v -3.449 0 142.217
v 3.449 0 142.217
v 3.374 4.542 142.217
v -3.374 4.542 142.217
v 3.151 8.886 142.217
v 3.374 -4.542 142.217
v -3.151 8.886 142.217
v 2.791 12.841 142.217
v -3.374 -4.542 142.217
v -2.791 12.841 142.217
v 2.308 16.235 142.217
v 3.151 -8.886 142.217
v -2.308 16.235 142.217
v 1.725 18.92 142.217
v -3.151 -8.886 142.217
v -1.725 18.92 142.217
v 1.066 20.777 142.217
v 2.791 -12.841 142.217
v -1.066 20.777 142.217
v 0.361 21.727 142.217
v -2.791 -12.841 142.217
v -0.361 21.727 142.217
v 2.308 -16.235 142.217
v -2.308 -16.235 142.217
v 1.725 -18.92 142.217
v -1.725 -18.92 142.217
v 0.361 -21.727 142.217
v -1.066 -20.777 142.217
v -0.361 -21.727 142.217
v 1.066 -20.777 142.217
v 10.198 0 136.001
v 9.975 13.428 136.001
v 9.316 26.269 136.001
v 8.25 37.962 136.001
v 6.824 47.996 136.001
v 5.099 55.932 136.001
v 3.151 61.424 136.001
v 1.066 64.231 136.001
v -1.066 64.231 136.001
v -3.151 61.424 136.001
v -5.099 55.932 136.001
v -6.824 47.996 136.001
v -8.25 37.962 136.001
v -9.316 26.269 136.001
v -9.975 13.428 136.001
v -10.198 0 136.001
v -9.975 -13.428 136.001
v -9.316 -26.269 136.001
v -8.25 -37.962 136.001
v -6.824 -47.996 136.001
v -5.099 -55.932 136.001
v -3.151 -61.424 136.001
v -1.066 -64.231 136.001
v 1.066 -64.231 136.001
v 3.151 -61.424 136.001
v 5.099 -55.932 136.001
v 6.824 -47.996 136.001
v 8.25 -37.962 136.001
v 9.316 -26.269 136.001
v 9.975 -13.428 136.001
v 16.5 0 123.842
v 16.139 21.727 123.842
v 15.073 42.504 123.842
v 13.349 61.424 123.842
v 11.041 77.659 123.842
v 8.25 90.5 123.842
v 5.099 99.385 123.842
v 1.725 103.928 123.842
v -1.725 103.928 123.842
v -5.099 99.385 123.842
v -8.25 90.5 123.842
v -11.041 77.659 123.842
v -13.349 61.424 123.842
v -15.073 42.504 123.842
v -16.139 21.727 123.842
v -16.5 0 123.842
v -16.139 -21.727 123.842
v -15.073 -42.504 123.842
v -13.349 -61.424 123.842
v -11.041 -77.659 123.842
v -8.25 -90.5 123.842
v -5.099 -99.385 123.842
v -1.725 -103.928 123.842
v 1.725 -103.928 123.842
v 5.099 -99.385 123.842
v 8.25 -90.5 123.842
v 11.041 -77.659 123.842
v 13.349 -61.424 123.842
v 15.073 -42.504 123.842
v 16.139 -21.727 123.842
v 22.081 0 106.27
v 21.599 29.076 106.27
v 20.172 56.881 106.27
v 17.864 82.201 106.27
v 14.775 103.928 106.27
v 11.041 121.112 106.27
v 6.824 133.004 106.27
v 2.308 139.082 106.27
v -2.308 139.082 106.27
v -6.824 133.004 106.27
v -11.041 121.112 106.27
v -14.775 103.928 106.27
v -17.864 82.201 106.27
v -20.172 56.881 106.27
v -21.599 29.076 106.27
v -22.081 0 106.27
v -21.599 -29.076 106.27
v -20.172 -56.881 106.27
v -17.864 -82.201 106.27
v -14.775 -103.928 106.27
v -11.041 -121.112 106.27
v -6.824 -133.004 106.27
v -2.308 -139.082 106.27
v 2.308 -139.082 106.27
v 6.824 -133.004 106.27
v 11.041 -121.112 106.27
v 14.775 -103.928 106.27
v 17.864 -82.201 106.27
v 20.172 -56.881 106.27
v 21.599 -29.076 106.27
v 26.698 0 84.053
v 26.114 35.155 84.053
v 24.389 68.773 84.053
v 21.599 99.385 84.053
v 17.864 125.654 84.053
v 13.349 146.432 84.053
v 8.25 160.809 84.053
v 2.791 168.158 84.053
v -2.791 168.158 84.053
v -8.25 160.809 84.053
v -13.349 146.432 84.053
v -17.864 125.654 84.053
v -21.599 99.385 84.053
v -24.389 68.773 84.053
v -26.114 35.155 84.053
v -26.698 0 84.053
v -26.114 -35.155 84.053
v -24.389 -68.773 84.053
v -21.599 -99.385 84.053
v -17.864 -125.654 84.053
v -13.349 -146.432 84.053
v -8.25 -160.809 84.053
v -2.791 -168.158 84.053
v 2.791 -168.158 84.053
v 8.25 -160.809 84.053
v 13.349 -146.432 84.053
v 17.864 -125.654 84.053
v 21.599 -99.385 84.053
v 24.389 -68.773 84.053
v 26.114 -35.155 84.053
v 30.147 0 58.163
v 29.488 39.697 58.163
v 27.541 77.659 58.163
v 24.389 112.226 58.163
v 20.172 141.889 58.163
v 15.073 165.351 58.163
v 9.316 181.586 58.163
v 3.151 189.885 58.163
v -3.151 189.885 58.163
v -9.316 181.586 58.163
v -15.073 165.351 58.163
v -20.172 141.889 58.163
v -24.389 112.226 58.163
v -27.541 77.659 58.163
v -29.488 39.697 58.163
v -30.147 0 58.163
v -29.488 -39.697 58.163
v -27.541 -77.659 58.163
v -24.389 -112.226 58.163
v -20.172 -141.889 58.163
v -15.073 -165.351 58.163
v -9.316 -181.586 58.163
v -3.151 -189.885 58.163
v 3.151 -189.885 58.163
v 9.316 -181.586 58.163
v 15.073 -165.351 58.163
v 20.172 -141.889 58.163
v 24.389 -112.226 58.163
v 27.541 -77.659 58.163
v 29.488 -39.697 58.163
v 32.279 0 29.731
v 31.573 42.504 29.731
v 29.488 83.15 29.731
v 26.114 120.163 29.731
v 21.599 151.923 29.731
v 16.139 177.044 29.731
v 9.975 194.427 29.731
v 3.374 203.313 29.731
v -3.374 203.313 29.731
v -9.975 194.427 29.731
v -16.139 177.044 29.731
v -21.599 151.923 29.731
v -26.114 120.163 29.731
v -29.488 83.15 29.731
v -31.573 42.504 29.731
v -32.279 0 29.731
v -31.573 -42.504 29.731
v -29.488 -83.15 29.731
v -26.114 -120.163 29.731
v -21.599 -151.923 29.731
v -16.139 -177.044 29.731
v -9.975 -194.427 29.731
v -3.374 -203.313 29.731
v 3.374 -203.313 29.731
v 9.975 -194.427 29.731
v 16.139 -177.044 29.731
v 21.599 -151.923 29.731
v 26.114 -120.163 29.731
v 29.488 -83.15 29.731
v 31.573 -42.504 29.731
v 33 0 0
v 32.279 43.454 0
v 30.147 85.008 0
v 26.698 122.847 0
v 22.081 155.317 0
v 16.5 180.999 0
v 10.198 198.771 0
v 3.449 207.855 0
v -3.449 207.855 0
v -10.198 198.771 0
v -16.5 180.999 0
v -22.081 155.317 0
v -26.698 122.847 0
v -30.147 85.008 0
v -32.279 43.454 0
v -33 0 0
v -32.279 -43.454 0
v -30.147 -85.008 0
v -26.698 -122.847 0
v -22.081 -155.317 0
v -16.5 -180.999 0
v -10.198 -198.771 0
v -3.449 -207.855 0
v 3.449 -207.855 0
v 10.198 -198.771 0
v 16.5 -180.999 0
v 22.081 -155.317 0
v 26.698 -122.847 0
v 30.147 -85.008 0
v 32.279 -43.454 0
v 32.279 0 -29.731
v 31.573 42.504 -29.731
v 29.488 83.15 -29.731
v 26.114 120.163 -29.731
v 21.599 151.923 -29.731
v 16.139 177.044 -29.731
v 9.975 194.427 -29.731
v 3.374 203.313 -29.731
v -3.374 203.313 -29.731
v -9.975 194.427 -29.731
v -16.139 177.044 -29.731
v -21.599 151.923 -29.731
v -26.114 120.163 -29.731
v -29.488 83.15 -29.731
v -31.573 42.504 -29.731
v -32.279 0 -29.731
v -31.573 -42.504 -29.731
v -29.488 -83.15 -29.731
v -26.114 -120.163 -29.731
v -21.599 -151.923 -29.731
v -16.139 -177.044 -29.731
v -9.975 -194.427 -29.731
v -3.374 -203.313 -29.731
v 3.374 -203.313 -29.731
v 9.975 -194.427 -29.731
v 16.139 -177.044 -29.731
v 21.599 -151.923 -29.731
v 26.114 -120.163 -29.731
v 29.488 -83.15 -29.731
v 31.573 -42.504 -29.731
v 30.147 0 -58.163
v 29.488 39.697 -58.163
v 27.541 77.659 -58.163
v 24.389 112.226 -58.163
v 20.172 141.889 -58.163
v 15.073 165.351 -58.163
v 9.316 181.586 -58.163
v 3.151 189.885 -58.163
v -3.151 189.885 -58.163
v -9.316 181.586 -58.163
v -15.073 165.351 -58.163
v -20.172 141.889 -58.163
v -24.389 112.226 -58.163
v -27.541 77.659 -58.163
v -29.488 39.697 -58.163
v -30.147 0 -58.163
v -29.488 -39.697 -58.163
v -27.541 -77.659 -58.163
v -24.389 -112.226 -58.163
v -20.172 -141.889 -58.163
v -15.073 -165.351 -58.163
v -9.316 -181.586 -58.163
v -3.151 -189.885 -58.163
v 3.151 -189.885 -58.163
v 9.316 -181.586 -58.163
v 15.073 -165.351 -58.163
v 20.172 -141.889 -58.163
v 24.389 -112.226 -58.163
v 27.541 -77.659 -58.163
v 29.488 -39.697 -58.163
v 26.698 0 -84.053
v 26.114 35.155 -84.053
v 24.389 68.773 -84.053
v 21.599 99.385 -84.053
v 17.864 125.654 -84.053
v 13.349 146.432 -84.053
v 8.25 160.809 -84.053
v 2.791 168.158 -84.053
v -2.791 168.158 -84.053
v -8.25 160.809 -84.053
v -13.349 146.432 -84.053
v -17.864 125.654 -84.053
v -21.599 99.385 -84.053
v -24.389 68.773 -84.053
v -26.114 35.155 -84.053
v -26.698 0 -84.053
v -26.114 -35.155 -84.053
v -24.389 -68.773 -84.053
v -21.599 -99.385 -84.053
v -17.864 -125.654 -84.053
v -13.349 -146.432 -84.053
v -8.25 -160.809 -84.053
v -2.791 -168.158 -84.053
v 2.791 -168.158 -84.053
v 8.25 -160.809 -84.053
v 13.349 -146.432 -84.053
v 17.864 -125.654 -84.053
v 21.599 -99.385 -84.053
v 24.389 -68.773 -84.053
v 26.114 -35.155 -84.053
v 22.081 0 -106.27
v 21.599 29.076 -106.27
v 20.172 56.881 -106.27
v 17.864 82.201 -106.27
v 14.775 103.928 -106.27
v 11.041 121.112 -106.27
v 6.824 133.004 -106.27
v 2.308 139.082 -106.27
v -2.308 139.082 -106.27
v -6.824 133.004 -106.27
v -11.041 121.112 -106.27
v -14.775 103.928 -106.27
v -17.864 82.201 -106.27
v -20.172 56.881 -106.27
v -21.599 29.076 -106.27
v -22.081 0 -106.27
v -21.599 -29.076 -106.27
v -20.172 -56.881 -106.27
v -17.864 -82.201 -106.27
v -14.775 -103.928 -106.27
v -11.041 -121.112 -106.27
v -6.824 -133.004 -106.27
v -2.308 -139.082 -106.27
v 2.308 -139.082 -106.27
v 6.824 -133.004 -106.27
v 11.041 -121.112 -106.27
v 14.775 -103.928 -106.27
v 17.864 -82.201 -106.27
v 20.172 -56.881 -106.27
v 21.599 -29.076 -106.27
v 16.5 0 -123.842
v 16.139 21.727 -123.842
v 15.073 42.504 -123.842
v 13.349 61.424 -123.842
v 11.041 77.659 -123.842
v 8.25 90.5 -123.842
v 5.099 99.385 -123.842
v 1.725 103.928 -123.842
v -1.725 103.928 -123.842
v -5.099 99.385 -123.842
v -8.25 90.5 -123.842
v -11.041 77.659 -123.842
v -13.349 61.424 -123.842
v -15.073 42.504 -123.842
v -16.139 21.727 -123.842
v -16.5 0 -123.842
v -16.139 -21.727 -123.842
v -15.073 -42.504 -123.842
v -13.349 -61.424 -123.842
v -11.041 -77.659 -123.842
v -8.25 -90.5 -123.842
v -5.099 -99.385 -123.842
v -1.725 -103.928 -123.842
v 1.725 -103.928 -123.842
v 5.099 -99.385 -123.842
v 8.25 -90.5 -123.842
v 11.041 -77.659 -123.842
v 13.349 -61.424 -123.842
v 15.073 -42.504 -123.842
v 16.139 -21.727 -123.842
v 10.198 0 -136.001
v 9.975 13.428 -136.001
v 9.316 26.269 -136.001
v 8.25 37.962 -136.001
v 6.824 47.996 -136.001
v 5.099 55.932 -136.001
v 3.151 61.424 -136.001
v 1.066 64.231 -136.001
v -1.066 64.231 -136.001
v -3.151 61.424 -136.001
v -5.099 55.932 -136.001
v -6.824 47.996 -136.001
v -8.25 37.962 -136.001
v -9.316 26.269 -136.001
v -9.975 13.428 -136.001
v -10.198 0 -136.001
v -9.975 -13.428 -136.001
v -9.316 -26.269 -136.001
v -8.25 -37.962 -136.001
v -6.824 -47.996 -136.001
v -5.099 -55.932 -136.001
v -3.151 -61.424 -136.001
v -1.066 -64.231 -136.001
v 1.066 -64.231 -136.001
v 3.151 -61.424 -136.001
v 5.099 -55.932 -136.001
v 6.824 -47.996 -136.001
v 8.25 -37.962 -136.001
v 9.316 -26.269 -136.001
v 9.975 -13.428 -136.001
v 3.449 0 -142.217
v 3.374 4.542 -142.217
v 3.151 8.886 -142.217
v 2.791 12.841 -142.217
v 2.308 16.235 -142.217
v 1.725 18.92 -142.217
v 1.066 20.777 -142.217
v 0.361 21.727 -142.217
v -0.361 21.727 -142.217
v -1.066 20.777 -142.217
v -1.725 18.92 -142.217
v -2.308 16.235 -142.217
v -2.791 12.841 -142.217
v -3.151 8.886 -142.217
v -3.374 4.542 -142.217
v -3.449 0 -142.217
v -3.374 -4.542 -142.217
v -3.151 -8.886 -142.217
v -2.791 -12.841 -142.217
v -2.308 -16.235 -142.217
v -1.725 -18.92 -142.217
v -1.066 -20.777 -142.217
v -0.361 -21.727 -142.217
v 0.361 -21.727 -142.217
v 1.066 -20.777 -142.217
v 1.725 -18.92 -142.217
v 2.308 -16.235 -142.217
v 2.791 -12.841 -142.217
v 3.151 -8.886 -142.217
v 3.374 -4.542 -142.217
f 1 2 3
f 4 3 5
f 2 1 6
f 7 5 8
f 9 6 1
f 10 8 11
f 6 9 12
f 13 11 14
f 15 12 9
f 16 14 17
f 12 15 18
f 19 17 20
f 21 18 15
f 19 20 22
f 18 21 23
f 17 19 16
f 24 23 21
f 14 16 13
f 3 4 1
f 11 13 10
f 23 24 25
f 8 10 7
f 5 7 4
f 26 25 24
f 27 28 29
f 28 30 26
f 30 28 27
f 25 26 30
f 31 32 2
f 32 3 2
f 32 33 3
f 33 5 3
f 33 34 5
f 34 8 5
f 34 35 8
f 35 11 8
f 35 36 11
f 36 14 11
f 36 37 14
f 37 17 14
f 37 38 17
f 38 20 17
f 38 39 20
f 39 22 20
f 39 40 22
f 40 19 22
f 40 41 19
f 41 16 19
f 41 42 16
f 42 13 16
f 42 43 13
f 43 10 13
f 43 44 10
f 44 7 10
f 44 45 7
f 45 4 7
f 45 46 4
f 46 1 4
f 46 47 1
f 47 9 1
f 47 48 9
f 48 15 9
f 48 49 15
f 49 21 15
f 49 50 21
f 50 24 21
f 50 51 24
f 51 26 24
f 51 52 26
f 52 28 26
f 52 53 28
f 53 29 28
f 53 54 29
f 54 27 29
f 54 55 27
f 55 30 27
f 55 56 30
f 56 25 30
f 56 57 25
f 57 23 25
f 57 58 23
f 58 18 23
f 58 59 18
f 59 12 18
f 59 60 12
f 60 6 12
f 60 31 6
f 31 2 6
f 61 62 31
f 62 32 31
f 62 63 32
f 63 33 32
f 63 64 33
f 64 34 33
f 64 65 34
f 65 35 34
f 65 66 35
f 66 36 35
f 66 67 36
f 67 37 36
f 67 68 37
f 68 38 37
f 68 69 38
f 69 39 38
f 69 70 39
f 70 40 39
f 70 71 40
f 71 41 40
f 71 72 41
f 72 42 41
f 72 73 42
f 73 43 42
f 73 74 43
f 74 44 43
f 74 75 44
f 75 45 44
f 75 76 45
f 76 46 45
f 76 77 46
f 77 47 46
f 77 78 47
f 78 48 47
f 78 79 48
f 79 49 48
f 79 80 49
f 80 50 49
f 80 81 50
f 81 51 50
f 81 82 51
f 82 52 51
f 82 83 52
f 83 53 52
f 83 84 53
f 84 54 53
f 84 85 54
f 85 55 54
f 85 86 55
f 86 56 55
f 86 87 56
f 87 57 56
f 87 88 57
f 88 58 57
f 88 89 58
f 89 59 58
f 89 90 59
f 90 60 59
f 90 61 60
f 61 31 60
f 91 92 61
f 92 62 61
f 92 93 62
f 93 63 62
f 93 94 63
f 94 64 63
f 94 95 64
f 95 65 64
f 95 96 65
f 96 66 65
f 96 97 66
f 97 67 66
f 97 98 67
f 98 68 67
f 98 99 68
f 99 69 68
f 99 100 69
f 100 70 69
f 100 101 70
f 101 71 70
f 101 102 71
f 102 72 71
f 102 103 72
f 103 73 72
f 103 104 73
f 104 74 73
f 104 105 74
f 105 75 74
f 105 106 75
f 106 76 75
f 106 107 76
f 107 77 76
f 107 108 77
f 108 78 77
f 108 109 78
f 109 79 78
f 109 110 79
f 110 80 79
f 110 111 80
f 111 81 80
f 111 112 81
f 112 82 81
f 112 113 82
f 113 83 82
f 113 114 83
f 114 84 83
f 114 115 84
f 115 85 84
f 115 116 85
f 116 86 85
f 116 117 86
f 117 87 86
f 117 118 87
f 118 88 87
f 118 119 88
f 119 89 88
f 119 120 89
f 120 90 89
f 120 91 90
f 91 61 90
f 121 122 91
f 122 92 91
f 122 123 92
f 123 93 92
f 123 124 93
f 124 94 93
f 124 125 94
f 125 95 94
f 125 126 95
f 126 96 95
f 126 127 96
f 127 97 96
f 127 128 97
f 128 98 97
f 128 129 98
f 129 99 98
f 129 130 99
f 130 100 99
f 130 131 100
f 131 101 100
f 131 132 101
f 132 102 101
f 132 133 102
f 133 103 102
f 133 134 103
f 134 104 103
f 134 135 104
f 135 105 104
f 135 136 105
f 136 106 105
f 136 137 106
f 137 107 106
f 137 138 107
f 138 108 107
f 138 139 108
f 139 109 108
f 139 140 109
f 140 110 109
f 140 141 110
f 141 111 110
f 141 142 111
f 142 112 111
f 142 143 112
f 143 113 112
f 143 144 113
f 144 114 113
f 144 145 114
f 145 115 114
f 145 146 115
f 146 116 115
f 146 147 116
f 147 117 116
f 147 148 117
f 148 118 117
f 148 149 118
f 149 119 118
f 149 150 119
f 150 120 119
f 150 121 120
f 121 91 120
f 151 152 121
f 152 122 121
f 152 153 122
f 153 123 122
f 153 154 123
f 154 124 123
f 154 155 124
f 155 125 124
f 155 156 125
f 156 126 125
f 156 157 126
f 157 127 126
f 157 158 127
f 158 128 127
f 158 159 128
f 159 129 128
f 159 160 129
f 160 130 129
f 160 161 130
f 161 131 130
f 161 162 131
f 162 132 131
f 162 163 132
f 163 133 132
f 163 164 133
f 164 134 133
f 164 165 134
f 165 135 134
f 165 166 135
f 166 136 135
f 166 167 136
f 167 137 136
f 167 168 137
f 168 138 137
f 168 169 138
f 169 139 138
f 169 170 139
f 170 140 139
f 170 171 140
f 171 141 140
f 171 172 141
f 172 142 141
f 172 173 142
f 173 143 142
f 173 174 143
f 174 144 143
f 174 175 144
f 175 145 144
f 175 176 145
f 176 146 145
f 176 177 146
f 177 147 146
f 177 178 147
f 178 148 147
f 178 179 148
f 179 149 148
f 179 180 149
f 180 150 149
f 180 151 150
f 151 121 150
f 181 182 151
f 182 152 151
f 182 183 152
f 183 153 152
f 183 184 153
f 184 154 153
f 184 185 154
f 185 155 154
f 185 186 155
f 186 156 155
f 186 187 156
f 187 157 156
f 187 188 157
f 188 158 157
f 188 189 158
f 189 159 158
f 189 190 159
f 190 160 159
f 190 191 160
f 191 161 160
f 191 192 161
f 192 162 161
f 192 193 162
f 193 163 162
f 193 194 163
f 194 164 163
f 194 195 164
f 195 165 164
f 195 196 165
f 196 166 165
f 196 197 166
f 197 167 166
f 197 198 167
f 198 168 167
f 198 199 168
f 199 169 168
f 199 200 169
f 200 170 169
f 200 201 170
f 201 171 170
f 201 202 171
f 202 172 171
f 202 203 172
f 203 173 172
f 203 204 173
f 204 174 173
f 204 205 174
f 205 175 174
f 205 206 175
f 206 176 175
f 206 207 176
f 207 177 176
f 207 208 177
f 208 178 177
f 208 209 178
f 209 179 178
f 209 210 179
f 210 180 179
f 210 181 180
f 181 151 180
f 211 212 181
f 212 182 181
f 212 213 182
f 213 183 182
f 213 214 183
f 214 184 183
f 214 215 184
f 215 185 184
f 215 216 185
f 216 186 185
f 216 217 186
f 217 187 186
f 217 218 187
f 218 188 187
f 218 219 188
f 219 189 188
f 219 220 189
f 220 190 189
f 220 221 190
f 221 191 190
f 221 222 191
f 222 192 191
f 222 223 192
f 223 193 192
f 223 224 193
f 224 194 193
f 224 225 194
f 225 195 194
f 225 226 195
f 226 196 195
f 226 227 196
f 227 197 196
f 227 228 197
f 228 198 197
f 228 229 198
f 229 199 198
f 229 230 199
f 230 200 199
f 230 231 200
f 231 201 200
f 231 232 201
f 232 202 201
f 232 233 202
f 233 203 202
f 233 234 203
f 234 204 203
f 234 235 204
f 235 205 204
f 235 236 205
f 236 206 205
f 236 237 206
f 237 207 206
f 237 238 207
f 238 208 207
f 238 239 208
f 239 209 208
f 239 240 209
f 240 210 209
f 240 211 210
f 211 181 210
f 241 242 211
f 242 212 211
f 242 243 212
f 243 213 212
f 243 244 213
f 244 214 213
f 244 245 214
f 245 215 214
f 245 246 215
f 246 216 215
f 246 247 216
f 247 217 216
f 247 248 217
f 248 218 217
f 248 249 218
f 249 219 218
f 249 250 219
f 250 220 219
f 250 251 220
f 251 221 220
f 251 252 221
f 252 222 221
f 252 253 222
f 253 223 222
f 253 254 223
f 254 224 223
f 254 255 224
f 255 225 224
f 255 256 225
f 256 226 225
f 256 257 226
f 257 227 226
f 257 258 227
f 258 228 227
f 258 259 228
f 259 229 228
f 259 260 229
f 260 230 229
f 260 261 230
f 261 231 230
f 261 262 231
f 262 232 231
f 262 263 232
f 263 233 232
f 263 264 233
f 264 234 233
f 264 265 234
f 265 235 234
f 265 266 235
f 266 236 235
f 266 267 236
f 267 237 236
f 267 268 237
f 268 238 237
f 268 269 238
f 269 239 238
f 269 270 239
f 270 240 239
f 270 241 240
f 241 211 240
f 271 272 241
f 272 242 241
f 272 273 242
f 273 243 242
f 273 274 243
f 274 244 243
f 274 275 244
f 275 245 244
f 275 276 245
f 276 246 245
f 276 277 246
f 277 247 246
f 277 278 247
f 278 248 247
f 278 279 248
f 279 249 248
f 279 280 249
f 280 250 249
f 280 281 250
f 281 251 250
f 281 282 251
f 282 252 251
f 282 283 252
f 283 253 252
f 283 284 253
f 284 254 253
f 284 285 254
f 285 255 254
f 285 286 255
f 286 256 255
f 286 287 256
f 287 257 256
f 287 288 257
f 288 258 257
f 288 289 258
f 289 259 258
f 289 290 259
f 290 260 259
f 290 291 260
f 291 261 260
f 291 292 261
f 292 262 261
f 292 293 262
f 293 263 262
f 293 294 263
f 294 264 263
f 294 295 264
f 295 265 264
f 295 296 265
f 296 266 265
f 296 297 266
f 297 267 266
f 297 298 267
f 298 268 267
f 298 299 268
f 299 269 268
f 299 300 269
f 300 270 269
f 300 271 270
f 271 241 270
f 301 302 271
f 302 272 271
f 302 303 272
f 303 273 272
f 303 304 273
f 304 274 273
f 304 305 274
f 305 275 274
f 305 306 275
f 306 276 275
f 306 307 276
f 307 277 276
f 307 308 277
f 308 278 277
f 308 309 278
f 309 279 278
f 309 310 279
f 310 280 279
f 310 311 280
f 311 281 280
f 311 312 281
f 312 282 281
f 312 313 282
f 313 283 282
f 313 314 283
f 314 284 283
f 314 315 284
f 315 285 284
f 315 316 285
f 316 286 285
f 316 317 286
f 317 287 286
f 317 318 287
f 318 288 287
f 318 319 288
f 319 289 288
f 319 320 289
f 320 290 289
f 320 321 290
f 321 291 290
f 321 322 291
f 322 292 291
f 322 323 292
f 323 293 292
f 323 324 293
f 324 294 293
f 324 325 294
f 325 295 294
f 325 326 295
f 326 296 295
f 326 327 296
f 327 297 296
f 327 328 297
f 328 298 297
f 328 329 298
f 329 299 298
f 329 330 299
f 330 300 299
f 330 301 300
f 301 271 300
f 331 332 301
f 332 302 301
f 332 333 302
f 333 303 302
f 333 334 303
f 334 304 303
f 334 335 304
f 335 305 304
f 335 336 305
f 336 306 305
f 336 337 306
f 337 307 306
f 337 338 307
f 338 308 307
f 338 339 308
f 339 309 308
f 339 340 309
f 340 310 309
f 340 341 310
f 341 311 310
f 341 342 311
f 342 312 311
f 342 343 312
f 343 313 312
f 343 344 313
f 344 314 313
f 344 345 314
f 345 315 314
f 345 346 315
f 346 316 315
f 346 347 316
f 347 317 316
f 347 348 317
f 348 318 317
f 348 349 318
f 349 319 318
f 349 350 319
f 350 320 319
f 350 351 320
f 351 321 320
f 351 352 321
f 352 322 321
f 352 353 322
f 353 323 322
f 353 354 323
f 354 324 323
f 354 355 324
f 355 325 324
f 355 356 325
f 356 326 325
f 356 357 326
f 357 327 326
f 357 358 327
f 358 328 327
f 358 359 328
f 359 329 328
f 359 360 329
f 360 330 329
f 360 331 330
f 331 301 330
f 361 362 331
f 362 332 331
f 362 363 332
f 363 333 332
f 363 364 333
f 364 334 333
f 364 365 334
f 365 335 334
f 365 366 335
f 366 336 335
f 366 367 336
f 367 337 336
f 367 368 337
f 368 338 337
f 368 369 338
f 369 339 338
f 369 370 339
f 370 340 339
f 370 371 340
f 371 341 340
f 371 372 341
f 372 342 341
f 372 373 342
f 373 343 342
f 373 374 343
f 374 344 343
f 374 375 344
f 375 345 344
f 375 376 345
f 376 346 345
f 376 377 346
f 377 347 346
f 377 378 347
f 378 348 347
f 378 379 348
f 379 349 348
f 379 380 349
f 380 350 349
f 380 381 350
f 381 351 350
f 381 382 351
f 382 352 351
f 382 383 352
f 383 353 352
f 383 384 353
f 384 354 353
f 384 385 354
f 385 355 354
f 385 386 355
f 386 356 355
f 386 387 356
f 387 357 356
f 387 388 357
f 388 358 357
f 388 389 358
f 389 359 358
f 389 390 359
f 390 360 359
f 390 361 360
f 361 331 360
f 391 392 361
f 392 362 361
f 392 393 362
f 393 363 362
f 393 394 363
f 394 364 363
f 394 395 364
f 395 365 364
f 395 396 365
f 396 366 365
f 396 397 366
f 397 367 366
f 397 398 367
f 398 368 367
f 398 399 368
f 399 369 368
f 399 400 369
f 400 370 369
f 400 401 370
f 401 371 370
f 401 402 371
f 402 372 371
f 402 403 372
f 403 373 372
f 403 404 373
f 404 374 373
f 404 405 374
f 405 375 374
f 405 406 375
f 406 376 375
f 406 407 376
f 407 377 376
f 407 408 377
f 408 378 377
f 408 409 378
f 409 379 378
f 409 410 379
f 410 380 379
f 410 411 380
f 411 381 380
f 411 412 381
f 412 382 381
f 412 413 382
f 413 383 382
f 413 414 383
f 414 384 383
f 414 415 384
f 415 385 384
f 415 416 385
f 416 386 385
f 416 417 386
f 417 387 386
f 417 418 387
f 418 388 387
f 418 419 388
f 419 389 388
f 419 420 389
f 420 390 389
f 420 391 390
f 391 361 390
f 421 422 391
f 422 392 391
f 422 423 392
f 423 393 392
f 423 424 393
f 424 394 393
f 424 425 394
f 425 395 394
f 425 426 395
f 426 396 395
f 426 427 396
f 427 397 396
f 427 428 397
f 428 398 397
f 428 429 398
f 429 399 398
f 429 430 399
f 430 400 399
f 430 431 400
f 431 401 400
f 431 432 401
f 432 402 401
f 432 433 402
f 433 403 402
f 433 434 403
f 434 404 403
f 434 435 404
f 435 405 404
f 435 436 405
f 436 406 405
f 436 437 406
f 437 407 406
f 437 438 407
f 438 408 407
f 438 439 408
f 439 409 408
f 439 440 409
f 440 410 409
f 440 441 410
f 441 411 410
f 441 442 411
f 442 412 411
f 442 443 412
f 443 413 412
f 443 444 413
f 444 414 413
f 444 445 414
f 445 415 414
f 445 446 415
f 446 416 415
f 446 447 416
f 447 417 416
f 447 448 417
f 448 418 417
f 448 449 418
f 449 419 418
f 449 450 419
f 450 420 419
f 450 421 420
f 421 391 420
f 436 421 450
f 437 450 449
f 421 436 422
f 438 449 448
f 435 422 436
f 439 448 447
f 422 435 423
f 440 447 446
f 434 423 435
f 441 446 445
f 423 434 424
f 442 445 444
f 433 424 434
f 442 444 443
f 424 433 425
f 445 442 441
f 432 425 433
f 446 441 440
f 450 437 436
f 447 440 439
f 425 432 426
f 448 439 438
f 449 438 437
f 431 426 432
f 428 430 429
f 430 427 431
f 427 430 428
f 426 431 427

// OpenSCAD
// Generated by SolidPython 1.0.1 on 2020-07-29 00:46:46


scale(v = [3, 19, 13]) {
	sphere(r = 11);
}
/***********************************************
*********      SolidPython code:      **********
************************************************
 
# import packages: SolidPython
from solid import *
from solid.utils import *
from itertools import chain, combinations, permutations


class Resize:

    def __init__(self, scad_file):
        self.scad_file = scad_file
        #self.scad_file = import_scad(scad_file)
        # cone/cylinder param:
        self.r1 = 0
        self.r2 = 0
        self.h = 0
        # rectangular prism param:
        self.w = 0
        self.l = 0
        # ellipse param:
        self.r = 0

    # import OpenScad code (file name corresponds to shape)


    # classify shape + parameters
    def assign(self, param1, param2, param3):
        if self.scad_file == 'cone.scad':
            self.r1 = param1
            self.r2 = param2
            self.h = param3
        elif self.scad_file == 'cylinder.scad':
            self.r1 = param1
            self.r2 = param2
            self.h = param3
        elif self.scad_file == 'rectangularPrism.scad':
            self.h = param1
            self.l = param2
            self.w = param3
        else:
            self.r = param1
            self.h = param2

    # resize parameters
    def iterate(self):
        x = range(3, 20, 2)
        i = 1
        if self.scad_file == 'cone.scad':
            tempList = list(permutations(x, 2))
            for temp in tempList:
                param1 = temp[0]
                param2 = temp[1]
                filepath = 'produced_scad_files/' + 'cone' + str(param1) + '_' + str(param2) + '_' + '.scad'
                scad_render_to_file(cylinder(h=param1, r1=param2, r2=0), filepath)

        elif self.scad_file == 'cylinder.scad':
            tempList = list(permutations(x, 3))
            for temp in tempList:
                param1 = temp[0]
                param2 = temp[1]
                filepath = 'produced_scad_files/' + 'cylinder' + str(param1) + '_' + str(param2) + '_' + '.scad'
                scad_render_to_file(cylinder(h=param1, r1=param2, r2=param2), filepath)

        elif self.scad_file == 'rectangularPrism.scad':
            tempList = list(permutations(x, 3))
            for temp in tempList:
                param1 = temp[0]
                param2 = temp[1]
                param3 = temp[2]
                filepath = 'produced_scad_files/' + 'rectangularPrism' + str(param1) + '_' + str(param2) + '_' + str(
                    param3) + '.scad'
                scad_render_to_file(cube(size=(param1, param2, param3)), filepath)

        elif self.scad_file == 'ellipse.scad':
            tempList = list(permutations(x, 4))
            for temp in tempList:
                param1 = temp[0]
                param2 = temp[1]
                param3 = temp[2]
                param4 = temp[3]
                filepath = 'produced_scad_files/' + 'ellipse' + str(param1) + '_' + str(param2) + '_' + str(param3) + '_' + str(param4) + '.scad'
                scad_render_to_file(scale([param1, param2, param3])(sphere(r=param4)), filepath)

    def render_to_scadfile(self):
        scad_render_to_file(scad, 'example.scad') 
 
************************************************/
